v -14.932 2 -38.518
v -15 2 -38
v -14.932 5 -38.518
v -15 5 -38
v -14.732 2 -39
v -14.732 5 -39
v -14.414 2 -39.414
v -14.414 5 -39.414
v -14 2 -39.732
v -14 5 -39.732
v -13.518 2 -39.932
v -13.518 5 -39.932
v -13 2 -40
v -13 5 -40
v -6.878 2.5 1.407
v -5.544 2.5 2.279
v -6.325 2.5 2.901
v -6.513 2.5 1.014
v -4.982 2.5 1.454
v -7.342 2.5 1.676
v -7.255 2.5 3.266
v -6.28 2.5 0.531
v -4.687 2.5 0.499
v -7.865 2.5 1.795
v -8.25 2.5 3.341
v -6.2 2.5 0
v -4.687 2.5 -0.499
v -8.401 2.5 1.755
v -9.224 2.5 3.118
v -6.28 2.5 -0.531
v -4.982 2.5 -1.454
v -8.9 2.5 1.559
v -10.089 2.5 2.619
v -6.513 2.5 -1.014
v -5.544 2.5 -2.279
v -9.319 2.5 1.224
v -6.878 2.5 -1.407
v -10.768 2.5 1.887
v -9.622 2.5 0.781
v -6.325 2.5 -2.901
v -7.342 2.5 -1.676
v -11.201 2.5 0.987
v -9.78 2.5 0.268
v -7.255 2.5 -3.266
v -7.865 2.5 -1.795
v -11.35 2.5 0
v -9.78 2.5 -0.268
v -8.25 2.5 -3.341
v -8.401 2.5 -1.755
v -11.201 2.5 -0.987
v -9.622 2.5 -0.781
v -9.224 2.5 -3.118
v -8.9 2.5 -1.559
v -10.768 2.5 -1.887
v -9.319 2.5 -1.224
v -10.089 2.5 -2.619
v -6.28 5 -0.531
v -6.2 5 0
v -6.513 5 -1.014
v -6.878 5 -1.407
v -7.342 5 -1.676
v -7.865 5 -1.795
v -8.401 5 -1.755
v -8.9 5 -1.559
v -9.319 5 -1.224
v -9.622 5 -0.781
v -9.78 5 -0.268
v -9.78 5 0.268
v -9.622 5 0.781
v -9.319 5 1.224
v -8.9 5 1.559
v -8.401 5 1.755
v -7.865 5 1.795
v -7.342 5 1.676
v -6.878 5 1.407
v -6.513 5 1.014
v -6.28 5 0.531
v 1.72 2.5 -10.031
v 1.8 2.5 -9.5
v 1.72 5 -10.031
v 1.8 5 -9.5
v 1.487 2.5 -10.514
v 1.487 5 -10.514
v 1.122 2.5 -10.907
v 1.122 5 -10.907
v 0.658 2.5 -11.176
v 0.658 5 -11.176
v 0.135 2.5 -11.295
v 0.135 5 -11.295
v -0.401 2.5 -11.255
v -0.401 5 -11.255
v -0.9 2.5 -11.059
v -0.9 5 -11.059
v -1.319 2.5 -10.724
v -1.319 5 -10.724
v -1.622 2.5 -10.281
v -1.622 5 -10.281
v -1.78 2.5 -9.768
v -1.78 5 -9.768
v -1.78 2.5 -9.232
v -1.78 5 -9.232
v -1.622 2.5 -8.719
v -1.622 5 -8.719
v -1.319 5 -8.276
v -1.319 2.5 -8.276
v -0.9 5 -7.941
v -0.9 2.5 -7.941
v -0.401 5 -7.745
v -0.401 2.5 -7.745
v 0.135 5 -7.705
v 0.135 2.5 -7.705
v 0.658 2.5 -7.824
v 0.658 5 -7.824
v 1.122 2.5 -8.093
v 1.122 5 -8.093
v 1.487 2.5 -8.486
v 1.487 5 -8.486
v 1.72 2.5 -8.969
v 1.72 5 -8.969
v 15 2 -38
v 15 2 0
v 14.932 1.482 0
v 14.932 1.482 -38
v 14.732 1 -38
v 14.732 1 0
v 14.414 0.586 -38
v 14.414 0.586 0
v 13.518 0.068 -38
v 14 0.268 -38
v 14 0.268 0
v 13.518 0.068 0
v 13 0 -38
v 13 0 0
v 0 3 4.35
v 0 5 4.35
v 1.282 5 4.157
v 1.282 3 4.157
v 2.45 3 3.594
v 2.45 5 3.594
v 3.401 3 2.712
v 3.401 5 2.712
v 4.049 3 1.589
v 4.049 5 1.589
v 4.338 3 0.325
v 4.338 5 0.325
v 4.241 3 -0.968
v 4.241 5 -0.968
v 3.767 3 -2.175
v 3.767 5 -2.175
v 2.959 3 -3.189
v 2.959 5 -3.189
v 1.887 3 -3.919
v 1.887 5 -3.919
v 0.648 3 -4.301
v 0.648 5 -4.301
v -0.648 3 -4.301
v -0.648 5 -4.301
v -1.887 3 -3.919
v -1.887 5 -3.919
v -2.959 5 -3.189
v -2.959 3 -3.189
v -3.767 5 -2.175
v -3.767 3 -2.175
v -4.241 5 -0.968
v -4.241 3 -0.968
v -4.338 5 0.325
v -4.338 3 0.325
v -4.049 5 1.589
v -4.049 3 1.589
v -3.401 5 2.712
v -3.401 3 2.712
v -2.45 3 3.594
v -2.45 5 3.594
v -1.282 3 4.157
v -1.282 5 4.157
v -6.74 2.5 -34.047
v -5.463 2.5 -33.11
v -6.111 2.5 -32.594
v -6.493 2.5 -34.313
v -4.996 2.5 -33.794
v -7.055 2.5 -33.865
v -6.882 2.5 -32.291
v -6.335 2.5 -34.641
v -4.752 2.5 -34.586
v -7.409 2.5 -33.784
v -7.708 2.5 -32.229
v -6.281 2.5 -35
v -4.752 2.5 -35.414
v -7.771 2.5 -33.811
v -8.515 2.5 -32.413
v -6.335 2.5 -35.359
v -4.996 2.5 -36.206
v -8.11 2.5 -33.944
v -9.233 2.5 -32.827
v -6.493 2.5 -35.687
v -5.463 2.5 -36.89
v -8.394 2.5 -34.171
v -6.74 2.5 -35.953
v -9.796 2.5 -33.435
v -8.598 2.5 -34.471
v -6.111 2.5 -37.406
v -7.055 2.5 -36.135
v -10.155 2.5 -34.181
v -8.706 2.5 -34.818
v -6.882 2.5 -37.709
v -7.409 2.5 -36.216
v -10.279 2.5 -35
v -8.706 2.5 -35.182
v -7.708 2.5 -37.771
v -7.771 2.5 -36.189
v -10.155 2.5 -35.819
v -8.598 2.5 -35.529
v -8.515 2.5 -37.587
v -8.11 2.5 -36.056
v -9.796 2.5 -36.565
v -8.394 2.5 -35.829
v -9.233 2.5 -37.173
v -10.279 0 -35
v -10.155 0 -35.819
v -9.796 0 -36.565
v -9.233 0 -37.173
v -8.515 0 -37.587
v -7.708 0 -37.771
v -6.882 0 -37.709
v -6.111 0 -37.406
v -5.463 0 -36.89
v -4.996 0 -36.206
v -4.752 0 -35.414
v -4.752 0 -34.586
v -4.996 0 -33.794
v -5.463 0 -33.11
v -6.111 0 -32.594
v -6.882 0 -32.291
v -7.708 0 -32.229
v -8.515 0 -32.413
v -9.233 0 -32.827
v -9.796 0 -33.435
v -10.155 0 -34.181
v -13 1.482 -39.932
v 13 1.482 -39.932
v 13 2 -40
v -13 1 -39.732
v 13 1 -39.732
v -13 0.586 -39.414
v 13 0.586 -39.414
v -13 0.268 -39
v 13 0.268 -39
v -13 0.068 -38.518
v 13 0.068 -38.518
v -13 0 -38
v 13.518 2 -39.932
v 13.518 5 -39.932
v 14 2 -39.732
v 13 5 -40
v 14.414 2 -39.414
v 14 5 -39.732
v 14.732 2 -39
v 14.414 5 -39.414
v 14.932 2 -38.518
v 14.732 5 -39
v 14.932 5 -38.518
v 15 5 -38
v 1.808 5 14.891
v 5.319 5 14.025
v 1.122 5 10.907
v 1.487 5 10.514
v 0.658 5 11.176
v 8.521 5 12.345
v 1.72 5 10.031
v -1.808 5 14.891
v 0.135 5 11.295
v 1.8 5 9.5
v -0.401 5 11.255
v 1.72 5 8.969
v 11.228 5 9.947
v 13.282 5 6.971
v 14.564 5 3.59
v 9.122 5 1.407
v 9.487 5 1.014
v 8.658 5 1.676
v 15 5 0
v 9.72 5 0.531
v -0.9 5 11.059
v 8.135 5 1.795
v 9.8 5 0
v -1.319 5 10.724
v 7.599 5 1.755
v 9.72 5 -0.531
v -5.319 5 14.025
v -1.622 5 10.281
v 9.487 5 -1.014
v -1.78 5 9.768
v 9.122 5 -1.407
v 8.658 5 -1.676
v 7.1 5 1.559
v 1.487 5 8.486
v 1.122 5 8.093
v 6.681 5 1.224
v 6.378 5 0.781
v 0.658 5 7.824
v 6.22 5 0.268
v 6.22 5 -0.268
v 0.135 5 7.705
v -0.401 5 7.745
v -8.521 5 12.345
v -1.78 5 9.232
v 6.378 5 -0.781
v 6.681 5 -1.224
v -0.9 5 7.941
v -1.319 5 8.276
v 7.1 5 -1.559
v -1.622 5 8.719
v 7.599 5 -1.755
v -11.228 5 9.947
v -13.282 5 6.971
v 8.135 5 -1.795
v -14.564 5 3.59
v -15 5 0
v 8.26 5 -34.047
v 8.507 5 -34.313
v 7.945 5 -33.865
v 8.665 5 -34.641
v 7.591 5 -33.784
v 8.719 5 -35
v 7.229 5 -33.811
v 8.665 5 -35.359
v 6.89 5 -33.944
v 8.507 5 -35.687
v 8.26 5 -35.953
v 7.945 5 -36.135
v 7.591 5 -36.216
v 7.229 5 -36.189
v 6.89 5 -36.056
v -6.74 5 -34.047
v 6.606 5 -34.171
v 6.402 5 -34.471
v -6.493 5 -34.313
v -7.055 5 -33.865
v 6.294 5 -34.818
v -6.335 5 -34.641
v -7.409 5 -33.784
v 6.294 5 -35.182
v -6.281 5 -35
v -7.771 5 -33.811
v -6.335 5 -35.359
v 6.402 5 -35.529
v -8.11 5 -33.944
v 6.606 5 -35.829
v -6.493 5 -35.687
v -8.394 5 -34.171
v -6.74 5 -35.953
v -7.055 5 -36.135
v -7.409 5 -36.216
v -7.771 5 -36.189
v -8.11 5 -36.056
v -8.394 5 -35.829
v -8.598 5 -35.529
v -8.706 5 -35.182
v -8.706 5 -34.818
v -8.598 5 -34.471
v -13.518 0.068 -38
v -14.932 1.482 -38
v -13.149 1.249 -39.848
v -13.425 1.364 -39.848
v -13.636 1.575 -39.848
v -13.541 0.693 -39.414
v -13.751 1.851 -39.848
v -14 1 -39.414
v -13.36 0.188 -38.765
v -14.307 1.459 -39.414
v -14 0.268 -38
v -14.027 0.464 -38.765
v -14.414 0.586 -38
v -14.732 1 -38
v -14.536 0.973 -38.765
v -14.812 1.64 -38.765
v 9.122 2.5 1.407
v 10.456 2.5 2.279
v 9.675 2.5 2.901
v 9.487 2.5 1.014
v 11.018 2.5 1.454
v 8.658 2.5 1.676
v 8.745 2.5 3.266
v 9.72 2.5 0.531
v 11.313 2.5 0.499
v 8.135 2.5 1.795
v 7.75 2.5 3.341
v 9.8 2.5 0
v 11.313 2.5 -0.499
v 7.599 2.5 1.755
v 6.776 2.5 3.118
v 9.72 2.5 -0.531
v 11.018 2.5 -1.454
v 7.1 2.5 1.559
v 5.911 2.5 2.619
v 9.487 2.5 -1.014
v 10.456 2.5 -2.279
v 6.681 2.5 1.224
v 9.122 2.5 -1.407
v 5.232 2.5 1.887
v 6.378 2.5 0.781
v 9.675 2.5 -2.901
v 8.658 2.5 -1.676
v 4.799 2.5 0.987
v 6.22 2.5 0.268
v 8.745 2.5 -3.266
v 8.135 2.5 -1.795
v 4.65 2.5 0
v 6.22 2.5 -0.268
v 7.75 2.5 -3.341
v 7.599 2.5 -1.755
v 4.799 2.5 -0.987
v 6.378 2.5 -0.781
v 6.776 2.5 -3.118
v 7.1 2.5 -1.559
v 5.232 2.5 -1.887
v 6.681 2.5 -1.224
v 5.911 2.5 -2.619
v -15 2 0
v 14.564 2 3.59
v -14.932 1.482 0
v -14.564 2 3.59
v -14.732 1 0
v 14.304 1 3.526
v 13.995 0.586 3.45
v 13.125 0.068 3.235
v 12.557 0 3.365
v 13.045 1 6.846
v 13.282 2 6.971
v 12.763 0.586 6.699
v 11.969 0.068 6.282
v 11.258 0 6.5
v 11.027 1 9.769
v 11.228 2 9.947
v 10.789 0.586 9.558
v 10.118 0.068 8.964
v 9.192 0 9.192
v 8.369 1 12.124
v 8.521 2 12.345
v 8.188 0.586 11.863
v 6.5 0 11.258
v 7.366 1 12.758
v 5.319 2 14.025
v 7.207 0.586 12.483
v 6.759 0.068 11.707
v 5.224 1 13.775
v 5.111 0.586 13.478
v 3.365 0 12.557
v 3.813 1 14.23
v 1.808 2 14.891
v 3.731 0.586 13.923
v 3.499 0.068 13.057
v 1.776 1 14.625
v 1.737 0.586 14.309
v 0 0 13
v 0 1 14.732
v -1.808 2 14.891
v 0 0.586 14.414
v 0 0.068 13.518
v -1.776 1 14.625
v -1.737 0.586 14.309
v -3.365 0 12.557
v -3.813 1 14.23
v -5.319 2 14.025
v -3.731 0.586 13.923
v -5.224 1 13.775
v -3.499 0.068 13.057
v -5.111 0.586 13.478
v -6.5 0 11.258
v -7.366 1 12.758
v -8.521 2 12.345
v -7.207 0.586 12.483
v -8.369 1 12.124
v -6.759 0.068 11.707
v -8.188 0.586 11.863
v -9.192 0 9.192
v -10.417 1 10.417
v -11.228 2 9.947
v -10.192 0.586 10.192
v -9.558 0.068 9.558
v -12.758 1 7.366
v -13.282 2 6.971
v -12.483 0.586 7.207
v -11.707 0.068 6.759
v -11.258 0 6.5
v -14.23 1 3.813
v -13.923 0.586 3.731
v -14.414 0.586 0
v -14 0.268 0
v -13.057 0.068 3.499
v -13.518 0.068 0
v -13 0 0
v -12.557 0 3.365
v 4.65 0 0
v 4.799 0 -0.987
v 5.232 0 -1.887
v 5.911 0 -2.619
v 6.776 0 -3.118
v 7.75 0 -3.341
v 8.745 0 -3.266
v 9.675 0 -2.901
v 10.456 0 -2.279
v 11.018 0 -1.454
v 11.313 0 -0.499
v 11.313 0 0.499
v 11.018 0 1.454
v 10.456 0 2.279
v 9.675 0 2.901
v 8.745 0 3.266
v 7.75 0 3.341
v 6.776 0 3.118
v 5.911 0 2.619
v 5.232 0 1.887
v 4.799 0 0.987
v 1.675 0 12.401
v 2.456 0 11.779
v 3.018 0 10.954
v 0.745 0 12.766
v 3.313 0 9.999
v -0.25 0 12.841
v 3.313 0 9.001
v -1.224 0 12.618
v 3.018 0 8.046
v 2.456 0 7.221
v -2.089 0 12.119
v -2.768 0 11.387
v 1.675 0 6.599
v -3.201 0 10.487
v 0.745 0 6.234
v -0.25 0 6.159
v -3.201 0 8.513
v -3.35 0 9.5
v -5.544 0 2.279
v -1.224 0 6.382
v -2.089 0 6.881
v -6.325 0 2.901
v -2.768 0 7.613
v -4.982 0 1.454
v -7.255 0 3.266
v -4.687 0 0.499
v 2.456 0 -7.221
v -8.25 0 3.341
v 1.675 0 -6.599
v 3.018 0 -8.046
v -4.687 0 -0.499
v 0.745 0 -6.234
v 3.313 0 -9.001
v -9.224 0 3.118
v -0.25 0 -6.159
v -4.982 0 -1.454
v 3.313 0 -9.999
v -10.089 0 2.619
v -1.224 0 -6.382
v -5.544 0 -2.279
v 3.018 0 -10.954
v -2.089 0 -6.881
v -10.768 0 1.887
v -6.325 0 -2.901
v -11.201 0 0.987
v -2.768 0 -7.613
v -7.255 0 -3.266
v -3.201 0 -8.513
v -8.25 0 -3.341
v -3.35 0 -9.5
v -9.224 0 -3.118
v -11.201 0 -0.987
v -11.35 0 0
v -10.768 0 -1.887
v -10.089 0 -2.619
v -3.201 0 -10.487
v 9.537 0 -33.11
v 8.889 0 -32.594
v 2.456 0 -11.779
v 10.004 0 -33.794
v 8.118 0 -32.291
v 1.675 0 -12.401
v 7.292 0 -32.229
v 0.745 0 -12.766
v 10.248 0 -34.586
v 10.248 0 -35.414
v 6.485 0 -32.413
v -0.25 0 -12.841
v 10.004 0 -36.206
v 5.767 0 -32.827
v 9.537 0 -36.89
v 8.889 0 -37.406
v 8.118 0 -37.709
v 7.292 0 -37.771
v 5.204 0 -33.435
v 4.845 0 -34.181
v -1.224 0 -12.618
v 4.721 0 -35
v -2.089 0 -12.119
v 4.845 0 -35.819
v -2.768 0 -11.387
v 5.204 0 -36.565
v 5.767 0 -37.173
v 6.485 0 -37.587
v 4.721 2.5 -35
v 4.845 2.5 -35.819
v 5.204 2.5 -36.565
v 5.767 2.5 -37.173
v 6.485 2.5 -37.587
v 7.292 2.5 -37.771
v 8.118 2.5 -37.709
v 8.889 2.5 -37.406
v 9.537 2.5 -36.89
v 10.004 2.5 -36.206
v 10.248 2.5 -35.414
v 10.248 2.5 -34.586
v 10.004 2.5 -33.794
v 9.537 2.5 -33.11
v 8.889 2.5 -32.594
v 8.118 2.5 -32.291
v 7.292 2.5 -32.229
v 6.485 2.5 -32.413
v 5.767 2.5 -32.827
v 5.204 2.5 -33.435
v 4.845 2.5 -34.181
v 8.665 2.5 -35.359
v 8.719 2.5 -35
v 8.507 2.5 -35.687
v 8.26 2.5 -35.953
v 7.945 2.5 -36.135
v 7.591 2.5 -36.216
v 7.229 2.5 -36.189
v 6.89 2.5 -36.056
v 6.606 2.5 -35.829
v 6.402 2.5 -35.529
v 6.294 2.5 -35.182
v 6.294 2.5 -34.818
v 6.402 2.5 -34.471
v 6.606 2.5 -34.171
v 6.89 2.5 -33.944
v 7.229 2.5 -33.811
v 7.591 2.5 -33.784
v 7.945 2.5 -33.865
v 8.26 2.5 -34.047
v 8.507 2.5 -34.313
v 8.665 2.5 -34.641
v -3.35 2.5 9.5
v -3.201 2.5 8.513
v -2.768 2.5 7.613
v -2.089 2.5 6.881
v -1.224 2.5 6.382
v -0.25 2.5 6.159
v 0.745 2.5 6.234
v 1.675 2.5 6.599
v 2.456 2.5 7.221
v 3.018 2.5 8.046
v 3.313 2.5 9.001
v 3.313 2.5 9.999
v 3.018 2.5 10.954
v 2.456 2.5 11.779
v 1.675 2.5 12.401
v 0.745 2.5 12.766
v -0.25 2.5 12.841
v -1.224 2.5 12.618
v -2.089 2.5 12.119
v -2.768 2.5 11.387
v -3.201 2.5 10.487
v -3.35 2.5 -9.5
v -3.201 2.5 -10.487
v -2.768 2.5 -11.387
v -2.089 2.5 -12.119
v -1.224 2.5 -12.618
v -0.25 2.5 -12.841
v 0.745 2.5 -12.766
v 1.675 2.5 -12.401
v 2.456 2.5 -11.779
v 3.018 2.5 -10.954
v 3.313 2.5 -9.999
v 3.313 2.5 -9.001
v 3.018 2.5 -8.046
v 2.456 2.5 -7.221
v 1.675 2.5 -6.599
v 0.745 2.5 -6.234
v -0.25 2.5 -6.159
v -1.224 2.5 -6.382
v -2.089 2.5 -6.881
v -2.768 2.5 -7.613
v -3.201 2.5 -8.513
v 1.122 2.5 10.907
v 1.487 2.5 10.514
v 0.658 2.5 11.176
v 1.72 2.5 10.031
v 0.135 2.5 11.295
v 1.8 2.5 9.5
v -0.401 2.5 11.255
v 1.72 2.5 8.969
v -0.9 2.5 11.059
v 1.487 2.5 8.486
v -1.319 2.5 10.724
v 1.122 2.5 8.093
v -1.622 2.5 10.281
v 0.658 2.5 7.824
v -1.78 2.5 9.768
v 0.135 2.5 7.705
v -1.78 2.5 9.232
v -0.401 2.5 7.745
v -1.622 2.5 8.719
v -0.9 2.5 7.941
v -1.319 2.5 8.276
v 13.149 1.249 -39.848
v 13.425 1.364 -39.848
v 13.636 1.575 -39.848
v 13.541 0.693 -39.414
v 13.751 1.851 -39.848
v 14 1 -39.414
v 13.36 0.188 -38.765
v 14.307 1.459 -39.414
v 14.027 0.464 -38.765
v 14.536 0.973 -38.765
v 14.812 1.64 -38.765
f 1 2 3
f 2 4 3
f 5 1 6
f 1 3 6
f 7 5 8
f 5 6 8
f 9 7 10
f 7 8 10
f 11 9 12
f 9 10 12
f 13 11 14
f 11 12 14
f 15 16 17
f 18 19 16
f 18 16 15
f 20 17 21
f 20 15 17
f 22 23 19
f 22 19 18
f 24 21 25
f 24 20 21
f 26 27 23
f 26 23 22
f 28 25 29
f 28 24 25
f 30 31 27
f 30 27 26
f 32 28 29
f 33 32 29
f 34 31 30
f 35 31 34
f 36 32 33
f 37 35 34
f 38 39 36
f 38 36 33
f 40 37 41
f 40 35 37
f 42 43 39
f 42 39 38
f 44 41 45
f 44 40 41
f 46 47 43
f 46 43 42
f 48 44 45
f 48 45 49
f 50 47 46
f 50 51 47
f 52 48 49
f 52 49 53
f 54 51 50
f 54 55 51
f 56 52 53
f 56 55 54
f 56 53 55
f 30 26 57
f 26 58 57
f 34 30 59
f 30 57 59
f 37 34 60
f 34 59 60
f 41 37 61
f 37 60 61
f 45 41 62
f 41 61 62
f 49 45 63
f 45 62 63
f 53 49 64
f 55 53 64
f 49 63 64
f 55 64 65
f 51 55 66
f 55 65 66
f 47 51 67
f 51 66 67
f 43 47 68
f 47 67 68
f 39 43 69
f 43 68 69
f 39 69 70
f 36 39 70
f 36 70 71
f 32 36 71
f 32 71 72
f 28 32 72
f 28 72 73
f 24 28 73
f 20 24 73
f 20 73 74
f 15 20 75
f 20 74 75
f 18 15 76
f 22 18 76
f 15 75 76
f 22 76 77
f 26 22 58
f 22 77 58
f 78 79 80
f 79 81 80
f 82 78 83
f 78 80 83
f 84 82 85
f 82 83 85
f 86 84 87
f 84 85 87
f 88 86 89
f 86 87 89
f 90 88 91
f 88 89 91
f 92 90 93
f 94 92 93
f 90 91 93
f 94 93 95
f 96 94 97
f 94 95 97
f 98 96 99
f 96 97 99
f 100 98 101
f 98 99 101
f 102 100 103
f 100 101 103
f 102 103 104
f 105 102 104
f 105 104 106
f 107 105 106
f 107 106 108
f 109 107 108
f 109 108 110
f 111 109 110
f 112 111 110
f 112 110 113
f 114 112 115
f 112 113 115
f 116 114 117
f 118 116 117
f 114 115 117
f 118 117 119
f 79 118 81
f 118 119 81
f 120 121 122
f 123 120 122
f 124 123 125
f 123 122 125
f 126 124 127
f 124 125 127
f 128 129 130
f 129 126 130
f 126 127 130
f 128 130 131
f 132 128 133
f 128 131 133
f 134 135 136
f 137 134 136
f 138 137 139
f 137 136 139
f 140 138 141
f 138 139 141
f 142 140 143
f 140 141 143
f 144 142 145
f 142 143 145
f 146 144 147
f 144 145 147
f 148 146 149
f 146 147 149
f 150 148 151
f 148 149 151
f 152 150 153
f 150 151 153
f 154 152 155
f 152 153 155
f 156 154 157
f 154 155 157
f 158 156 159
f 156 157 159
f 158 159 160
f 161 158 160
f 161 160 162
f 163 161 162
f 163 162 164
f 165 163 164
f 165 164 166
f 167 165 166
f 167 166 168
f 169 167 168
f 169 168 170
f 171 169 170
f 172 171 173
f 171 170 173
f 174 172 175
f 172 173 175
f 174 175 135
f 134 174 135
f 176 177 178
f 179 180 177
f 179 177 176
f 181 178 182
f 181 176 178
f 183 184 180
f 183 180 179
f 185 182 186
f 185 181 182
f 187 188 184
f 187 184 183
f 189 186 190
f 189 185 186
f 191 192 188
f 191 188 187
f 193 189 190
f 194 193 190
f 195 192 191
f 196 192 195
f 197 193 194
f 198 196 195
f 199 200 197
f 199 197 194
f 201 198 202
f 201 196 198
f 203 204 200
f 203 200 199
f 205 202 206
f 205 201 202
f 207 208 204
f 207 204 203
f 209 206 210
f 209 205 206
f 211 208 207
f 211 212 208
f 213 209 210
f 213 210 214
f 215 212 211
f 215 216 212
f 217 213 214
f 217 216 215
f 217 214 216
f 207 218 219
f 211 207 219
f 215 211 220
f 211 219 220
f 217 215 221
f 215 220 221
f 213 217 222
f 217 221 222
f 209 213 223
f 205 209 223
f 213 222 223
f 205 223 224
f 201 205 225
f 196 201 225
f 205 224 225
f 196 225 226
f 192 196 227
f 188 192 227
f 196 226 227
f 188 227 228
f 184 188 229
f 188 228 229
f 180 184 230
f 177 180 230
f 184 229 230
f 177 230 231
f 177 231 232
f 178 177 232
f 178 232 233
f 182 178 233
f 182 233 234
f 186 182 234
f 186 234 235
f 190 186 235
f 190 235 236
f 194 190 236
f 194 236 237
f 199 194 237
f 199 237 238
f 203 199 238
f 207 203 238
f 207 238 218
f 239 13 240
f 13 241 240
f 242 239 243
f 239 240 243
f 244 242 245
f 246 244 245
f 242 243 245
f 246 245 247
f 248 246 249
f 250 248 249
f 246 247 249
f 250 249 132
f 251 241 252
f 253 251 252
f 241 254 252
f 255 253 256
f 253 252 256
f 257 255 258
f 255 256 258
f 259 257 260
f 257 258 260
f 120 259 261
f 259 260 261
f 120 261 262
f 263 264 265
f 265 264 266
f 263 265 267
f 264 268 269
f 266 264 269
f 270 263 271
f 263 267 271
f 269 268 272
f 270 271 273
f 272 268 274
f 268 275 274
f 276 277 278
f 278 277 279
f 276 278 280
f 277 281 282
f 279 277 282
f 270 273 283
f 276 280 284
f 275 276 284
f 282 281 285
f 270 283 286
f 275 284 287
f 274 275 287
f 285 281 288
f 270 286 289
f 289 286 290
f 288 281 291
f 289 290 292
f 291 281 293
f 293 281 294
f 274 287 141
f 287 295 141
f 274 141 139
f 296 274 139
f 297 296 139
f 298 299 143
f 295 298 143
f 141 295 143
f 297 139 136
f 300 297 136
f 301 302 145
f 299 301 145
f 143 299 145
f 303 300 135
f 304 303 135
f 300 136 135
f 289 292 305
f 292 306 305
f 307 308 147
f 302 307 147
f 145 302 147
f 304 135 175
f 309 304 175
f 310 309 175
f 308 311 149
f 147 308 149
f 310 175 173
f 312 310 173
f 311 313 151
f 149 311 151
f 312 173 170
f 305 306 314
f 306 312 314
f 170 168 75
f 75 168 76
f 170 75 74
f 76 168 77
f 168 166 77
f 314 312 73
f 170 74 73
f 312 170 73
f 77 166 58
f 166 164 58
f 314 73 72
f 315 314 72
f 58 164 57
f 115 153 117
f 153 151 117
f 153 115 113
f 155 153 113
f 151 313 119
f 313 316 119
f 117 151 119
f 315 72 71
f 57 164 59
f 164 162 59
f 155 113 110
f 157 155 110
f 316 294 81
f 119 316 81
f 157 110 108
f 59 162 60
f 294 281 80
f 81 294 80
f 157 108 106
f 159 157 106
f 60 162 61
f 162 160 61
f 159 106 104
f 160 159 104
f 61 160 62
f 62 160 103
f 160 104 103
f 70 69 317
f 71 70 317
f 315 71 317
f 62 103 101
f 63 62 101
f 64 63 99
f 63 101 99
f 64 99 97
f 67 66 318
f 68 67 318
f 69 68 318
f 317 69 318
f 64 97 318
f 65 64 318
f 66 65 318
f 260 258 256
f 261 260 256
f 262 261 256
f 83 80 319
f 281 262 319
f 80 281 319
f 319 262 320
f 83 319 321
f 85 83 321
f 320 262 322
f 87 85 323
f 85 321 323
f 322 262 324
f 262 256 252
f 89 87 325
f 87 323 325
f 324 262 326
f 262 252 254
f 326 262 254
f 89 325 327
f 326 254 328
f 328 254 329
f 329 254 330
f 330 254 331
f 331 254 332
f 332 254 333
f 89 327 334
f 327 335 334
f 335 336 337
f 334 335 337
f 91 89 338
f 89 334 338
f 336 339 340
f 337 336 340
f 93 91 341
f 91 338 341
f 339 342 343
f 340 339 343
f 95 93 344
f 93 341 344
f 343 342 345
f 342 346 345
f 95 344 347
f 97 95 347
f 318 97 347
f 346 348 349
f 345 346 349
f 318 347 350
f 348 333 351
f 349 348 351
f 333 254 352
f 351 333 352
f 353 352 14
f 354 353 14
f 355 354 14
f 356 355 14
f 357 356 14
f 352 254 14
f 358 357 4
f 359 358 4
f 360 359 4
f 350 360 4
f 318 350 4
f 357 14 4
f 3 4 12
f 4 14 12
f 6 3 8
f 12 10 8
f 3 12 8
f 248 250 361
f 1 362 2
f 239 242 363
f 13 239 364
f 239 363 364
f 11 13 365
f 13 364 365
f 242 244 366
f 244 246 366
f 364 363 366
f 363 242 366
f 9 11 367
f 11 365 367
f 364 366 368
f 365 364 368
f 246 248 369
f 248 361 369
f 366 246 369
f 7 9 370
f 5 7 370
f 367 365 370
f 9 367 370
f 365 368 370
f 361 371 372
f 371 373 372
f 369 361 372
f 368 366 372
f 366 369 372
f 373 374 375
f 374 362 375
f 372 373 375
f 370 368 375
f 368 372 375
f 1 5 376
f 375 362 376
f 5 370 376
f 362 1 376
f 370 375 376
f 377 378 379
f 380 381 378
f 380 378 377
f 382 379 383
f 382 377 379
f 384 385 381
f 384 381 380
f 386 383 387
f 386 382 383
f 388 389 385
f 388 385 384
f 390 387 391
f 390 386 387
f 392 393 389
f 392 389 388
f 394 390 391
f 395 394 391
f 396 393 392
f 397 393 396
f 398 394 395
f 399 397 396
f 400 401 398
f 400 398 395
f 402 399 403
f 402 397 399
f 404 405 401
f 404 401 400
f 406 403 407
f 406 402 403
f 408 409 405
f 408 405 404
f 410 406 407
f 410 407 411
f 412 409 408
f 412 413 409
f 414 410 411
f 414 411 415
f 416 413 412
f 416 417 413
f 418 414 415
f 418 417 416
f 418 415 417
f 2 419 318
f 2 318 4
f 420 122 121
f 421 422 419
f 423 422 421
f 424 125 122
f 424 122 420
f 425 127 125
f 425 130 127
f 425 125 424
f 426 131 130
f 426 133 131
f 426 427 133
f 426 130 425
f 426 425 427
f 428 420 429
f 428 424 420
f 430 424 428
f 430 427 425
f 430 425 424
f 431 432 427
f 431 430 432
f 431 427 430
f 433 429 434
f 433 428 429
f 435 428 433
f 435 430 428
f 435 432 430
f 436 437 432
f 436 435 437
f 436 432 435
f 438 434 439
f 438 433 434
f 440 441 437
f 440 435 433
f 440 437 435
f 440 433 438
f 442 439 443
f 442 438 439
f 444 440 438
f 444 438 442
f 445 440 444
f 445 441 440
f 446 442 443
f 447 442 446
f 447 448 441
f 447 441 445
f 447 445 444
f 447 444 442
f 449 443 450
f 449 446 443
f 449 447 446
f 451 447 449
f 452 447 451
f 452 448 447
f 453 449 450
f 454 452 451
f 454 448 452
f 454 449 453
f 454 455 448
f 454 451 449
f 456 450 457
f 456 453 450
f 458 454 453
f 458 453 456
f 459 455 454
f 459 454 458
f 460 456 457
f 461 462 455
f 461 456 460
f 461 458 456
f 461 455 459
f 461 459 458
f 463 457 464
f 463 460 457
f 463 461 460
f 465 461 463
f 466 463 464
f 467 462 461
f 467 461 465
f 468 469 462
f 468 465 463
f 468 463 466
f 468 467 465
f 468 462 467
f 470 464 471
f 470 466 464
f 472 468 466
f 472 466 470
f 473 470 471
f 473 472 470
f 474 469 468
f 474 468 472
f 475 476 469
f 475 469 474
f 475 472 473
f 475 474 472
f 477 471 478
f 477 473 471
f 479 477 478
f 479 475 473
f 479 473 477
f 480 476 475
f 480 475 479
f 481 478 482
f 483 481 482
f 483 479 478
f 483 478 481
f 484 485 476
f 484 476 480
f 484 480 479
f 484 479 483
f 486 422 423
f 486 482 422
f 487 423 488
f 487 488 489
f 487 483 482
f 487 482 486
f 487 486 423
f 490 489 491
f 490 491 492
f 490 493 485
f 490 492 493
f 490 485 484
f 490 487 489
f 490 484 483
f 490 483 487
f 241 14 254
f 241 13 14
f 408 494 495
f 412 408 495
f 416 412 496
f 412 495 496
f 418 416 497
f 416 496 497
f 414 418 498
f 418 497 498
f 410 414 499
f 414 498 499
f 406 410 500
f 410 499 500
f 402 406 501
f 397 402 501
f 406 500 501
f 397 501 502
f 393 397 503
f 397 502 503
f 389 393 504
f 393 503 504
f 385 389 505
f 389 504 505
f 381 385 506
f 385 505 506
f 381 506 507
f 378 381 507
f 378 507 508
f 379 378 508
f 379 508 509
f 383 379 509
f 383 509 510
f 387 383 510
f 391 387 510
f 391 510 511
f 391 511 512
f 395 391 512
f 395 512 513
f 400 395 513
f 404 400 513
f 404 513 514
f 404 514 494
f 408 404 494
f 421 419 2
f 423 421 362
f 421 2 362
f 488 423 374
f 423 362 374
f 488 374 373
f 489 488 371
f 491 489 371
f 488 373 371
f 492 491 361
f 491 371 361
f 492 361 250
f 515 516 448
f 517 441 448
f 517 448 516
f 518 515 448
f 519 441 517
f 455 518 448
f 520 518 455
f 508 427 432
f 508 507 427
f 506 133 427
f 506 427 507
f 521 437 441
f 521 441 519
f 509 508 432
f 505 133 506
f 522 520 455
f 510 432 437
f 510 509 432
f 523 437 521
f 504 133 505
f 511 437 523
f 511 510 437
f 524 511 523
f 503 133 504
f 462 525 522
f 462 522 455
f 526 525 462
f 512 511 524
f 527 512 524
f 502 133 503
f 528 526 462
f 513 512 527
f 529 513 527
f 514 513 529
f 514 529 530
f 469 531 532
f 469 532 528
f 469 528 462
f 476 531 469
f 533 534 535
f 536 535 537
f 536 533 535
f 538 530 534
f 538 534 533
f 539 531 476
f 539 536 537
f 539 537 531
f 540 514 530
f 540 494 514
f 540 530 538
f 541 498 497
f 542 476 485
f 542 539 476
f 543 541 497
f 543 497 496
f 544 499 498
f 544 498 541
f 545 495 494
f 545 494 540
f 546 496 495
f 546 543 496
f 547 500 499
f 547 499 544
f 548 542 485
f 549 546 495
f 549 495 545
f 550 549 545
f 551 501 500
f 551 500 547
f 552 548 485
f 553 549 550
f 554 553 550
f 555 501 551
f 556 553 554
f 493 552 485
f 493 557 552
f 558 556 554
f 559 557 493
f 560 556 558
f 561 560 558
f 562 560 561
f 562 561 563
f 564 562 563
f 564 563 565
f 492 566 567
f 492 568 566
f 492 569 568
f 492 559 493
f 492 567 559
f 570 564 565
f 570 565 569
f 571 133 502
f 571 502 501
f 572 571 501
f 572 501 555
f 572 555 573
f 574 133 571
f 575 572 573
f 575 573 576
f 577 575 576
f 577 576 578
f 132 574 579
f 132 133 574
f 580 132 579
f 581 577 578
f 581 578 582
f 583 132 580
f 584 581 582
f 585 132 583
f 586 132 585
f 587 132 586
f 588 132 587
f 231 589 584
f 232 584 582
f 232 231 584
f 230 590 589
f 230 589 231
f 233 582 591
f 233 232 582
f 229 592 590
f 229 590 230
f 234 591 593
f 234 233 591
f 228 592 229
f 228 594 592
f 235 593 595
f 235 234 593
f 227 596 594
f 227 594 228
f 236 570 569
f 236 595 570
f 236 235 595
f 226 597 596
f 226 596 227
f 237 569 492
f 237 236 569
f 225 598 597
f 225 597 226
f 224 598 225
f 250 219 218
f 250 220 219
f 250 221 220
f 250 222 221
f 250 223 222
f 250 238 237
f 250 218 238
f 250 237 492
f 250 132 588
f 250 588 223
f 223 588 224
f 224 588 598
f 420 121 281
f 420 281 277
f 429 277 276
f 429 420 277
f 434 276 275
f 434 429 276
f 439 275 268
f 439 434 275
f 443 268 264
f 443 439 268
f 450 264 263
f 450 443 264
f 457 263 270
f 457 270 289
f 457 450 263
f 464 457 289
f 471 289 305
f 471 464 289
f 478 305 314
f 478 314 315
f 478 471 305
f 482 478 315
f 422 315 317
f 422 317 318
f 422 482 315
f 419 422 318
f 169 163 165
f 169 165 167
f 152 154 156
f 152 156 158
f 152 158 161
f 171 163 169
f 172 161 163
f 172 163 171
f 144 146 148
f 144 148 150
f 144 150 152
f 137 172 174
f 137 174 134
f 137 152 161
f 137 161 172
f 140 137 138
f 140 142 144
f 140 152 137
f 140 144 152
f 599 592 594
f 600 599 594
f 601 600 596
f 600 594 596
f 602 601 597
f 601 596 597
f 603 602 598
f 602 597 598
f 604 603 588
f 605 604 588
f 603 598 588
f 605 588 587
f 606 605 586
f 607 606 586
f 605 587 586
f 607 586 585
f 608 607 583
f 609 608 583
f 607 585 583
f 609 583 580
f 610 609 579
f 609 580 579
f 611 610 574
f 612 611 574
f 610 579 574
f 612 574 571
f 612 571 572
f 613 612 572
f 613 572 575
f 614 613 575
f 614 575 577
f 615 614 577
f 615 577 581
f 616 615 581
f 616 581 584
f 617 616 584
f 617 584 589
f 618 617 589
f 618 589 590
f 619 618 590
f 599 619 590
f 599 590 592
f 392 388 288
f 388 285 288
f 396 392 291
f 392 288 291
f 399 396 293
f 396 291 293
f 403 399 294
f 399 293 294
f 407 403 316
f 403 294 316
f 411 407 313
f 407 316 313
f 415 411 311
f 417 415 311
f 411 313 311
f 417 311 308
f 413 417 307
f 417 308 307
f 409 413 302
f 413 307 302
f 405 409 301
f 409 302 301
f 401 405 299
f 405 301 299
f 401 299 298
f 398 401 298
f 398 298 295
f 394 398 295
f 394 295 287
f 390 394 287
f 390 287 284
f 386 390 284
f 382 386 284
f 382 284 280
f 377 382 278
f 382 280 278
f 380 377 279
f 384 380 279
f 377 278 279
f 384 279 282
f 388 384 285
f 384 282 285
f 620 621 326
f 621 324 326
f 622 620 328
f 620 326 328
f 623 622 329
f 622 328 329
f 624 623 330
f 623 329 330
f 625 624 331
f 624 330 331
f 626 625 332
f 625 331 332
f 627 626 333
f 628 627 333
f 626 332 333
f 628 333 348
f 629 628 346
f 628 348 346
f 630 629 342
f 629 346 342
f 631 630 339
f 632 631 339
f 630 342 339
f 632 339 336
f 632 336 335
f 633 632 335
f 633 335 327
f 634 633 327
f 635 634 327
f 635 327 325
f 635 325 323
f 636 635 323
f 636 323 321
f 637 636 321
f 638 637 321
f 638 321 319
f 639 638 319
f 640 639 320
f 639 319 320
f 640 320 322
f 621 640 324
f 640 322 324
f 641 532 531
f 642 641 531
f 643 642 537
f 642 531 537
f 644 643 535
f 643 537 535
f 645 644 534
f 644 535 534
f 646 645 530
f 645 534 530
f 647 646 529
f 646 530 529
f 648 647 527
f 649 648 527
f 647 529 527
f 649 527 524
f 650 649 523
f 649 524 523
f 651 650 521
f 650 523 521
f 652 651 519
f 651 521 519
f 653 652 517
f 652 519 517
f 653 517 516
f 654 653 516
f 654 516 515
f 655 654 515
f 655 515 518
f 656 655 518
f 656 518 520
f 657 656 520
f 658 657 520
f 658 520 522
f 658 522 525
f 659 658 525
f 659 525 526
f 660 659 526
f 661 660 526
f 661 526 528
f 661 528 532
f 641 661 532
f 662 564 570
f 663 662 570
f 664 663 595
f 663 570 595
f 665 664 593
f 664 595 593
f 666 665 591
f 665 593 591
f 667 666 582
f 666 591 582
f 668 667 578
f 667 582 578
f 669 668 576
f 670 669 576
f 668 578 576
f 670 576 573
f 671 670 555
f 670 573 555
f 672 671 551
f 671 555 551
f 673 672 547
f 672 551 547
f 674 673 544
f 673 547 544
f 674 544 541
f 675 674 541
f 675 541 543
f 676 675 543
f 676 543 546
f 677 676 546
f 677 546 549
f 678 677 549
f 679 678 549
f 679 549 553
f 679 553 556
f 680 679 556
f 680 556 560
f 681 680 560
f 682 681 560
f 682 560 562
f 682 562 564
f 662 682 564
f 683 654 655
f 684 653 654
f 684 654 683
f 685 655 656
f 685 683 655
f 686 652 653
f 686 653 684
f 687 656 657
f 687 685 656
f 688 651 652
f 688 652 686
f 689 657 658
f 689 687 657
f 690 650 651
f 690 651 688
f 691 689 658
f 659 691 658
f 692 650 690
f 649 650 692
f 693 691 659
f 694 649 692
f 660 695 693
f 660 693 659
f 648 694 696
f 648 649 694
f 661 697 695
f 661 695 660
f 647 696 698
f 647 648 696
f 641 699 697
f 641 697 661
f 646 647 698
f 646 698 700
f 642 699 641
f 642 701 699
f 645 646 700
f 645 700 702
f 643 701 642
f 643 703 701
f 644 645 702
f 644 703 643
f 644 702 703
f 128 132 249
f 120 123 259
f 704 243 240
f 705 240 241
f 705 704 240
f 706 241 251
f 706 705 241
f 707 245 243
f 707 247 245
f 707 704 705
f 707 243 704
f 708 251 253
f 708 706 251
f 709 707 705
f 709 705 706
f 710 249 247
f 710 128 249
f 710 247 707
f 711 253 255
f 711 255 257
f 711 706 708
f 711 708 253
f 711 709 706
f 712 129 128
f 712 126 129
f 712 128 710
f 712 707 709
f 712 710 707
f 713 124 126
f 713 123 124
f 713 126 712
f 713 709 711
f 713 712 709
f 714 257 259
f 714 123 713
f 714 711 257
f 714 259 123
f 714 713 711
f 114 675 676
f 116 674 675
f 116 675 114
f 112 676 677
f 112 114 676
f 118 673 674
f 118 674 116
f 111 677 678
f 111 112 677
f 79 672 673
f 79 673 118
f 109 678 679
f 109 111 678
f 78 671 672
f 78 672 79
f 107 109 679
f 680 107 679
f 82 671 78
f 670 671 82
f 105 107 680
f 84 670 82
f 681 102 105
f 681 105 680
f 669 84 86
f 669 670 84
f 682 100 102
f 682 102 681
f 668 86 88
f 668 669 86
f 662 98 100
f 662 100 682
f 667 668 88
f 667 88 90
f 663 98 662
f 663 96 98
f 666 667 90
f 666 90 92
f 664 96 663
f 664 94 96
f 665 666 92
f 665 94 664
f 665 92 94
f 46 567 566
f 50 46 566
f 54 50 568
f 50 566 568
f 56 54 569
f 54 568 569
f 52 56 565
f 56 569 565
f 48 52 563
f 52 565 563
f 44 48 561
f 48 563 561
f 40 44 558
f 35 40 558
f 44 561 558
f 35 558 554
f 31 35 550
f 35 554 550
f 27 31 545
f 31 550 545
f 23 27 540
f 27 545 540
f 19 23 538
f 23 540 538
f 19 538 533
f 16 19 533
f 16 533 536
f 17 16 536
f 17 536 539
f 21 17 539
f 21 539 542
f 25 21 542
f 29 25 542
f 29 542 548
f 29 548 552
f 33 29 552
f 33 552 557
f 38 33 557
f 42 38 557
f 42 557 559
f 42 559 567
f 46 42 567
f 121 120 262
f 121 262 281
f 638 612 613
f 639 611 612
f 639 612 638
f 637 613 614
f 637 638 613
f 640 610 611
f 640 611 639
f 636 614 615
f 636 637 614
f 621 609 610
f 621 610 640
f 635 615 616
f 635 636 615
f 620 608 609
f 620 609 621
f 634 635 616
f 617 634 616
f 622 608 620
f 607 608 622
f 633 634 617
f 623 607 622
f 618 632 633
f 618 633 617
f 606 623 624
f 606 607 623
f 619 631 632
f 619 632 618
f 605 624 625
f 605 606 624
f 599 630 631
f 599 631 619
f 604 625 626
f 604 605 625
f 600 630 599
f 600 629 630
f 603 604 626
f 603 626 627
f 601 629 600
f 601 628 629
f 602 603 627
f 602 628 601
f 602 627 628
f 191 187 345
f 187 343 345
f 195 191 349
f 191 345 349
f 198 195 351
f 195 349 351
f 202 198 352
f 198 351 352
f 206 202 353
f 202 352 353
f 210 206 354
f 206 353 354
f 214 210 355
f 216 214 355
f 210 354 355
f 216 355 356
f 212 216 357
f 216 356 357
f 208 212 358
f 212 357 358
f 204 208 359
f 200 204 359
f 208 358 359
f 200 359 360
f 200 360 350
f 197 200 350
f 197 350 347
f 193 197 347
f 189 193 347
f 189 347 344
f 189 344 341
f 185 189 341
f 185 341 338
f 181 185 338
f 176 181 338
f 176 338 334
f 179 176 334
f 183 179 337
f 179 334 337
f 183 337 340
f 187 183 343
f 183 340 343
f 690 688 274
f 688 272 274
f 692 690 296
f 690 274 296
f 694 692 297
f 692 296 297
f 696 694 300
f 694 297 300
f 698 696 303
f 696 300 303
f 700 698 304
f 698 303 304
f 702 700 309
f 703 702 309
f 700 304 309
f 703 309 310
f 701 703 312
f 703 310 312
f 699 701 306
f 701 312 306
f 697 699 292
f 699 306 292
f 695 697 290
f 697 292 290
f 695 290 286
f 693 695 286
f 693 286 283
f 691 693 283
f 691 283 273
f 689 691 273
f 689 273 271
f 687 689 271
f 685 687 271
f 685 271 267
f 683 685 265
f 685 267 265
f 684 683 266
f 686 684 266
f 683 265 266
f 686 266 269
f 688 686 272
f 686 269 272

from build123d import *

# Parameters (mm, degrees)
BOSS_EXTRUDE1_DEPTH                                 = 5
SKETCH2_R                                           = 0.5
CUT_EXTRUDE1_DEPTH                                  = 44.011626335
CBORE_FOR_2_BINDING_HEAD_MACHINE_SCREW1_D           = 2.4384
CBORE_FOR_2_BINDING_HEAD_MACHINE_SCREW1_CBORE_D     = 5.55752
CBORE_FOR_2_BINDING_HEAD_MACHINE_SCREW1_CBORE_DEPTH = 2.499995
FILLET1_R                                           = 2
SKETCH6_R                                           = 4.35
CUT_EXTRUDE2_DEPTH                                  = 2
CBORE_FOR_M3_SBHCS1_D                               = 3.6
CBORE_FOR_M3_SBHCS1_CBORE_D                         = 6.7
CBORE_FOR_M3_SBHCS1_CBORE_DEPTH                     = 2.5


with BuildPart() as part:
    # Sketch1 → Boss-Extrude1 (new body)
    with BuildSketch(Plane(origin=(0, 0, 0), x_dir=(1, 0, 0), z_dir=(0, 1, 0))):
        with BuildLine():
            Line((-15, 0), (-15, 40))
            Line((-15, 40), (15, 40))
            Line((15, 40), (15, 0))
            ThreePointArc((15, 0), (0, -15), (-15, 0))
        make_face()
    extrude(amount=BOSS_EXTRUDE1_DEPTH)

    # Sketch2 → Cut-Extrude1 (cut, through all)
    with BuildSketch(Plane(origin=(0, 5, 0), x_dir=(1, 0, 0), z_dir=(0, 1, 0))):
        with Locations(Location((-8, 0, 0), (0, 0, 270))):
            Circle(SKETCH2_R)
        with Locations(Location((0, 9.5, 0), (0, 0, 270))):
            Circle(SKETCH2_R)
        with Locations(Location((8, 0, 0), (0, 0, 270))):
            Circle(SKETCH2_R)
        with Locations(Location((0, -9.5, 0), (0, 0, 270))):
            Circle(SKETCH2_R)
    extrude(amount=-CUT_EXTRUDE1_DEPTH, mode=Mode.SUBTRACT)

    # CBORE for #2 Binding Head Machine Screw1 (through all)
    with Locations(Plane(origin=(0, 0, 0), x_dir=(-1, 0, 0), z_dir=(0, -1, 0))):
        with Locations((-7.5, 35), (7.5, 35)):
            CounterBoreHole(CBORE_FOR_2_BINDING_HEAD_MACHINE_SCREW1_D / 2, CBORE_FOR_2_BINDING_HEAD_MACHINE_SCREW1_CBORE_D / 2, CBORE_FOR_2_BINDING_HEAD_MACHINE_SCREW1_CBORE_DEPTH)

    # Fillet1
    fillet1_edges = [part.edges().sort_by_distance(p)[0] for p in [
        (-15, 0, -20),
        (0, 0, -40),
        (15, 0, -20),
        (0, 0, 15),
        (-15, 2.5, -40),
        (15, 2.5, -40),
    ]]
    fillet(fillet1_edges, radius=FILLET1_R)

    # Sketch6 → Cut-Extrude2 (cut)
    with BuildSketch(Plane(origin=(0, 5, 0), x_dir=(1, 0, 0), z_dir=(0, 1, 0))):
        with Locations(Location((0, 0, 0), (0, 0, 270))):
            Circle(SKETCH6_R)
    extrude(amount=-CUT_EXTRUDE2_DEPTH, mode=Mode.SUBTRACT)

    # CBORE for M3 SBHCS1 (through all)
    with Locations(Plane(origin=(0, 0, 0), x_dir=(-1, 0, 0), z_dir=(0, -1, 0))):
        with Locations((0, 9.5), (8, 0), (0, -9.5), (-8, 0)):
            CounterBoreHole(CBORE_FOR_M3_SBHCS1_D / 2, CBORE_FOR_M3_SBHCS1_CBORE_D / 2, CBORE_FOR_M3_SBHCS1_CBORE_DEPTH)


solid = part.part
